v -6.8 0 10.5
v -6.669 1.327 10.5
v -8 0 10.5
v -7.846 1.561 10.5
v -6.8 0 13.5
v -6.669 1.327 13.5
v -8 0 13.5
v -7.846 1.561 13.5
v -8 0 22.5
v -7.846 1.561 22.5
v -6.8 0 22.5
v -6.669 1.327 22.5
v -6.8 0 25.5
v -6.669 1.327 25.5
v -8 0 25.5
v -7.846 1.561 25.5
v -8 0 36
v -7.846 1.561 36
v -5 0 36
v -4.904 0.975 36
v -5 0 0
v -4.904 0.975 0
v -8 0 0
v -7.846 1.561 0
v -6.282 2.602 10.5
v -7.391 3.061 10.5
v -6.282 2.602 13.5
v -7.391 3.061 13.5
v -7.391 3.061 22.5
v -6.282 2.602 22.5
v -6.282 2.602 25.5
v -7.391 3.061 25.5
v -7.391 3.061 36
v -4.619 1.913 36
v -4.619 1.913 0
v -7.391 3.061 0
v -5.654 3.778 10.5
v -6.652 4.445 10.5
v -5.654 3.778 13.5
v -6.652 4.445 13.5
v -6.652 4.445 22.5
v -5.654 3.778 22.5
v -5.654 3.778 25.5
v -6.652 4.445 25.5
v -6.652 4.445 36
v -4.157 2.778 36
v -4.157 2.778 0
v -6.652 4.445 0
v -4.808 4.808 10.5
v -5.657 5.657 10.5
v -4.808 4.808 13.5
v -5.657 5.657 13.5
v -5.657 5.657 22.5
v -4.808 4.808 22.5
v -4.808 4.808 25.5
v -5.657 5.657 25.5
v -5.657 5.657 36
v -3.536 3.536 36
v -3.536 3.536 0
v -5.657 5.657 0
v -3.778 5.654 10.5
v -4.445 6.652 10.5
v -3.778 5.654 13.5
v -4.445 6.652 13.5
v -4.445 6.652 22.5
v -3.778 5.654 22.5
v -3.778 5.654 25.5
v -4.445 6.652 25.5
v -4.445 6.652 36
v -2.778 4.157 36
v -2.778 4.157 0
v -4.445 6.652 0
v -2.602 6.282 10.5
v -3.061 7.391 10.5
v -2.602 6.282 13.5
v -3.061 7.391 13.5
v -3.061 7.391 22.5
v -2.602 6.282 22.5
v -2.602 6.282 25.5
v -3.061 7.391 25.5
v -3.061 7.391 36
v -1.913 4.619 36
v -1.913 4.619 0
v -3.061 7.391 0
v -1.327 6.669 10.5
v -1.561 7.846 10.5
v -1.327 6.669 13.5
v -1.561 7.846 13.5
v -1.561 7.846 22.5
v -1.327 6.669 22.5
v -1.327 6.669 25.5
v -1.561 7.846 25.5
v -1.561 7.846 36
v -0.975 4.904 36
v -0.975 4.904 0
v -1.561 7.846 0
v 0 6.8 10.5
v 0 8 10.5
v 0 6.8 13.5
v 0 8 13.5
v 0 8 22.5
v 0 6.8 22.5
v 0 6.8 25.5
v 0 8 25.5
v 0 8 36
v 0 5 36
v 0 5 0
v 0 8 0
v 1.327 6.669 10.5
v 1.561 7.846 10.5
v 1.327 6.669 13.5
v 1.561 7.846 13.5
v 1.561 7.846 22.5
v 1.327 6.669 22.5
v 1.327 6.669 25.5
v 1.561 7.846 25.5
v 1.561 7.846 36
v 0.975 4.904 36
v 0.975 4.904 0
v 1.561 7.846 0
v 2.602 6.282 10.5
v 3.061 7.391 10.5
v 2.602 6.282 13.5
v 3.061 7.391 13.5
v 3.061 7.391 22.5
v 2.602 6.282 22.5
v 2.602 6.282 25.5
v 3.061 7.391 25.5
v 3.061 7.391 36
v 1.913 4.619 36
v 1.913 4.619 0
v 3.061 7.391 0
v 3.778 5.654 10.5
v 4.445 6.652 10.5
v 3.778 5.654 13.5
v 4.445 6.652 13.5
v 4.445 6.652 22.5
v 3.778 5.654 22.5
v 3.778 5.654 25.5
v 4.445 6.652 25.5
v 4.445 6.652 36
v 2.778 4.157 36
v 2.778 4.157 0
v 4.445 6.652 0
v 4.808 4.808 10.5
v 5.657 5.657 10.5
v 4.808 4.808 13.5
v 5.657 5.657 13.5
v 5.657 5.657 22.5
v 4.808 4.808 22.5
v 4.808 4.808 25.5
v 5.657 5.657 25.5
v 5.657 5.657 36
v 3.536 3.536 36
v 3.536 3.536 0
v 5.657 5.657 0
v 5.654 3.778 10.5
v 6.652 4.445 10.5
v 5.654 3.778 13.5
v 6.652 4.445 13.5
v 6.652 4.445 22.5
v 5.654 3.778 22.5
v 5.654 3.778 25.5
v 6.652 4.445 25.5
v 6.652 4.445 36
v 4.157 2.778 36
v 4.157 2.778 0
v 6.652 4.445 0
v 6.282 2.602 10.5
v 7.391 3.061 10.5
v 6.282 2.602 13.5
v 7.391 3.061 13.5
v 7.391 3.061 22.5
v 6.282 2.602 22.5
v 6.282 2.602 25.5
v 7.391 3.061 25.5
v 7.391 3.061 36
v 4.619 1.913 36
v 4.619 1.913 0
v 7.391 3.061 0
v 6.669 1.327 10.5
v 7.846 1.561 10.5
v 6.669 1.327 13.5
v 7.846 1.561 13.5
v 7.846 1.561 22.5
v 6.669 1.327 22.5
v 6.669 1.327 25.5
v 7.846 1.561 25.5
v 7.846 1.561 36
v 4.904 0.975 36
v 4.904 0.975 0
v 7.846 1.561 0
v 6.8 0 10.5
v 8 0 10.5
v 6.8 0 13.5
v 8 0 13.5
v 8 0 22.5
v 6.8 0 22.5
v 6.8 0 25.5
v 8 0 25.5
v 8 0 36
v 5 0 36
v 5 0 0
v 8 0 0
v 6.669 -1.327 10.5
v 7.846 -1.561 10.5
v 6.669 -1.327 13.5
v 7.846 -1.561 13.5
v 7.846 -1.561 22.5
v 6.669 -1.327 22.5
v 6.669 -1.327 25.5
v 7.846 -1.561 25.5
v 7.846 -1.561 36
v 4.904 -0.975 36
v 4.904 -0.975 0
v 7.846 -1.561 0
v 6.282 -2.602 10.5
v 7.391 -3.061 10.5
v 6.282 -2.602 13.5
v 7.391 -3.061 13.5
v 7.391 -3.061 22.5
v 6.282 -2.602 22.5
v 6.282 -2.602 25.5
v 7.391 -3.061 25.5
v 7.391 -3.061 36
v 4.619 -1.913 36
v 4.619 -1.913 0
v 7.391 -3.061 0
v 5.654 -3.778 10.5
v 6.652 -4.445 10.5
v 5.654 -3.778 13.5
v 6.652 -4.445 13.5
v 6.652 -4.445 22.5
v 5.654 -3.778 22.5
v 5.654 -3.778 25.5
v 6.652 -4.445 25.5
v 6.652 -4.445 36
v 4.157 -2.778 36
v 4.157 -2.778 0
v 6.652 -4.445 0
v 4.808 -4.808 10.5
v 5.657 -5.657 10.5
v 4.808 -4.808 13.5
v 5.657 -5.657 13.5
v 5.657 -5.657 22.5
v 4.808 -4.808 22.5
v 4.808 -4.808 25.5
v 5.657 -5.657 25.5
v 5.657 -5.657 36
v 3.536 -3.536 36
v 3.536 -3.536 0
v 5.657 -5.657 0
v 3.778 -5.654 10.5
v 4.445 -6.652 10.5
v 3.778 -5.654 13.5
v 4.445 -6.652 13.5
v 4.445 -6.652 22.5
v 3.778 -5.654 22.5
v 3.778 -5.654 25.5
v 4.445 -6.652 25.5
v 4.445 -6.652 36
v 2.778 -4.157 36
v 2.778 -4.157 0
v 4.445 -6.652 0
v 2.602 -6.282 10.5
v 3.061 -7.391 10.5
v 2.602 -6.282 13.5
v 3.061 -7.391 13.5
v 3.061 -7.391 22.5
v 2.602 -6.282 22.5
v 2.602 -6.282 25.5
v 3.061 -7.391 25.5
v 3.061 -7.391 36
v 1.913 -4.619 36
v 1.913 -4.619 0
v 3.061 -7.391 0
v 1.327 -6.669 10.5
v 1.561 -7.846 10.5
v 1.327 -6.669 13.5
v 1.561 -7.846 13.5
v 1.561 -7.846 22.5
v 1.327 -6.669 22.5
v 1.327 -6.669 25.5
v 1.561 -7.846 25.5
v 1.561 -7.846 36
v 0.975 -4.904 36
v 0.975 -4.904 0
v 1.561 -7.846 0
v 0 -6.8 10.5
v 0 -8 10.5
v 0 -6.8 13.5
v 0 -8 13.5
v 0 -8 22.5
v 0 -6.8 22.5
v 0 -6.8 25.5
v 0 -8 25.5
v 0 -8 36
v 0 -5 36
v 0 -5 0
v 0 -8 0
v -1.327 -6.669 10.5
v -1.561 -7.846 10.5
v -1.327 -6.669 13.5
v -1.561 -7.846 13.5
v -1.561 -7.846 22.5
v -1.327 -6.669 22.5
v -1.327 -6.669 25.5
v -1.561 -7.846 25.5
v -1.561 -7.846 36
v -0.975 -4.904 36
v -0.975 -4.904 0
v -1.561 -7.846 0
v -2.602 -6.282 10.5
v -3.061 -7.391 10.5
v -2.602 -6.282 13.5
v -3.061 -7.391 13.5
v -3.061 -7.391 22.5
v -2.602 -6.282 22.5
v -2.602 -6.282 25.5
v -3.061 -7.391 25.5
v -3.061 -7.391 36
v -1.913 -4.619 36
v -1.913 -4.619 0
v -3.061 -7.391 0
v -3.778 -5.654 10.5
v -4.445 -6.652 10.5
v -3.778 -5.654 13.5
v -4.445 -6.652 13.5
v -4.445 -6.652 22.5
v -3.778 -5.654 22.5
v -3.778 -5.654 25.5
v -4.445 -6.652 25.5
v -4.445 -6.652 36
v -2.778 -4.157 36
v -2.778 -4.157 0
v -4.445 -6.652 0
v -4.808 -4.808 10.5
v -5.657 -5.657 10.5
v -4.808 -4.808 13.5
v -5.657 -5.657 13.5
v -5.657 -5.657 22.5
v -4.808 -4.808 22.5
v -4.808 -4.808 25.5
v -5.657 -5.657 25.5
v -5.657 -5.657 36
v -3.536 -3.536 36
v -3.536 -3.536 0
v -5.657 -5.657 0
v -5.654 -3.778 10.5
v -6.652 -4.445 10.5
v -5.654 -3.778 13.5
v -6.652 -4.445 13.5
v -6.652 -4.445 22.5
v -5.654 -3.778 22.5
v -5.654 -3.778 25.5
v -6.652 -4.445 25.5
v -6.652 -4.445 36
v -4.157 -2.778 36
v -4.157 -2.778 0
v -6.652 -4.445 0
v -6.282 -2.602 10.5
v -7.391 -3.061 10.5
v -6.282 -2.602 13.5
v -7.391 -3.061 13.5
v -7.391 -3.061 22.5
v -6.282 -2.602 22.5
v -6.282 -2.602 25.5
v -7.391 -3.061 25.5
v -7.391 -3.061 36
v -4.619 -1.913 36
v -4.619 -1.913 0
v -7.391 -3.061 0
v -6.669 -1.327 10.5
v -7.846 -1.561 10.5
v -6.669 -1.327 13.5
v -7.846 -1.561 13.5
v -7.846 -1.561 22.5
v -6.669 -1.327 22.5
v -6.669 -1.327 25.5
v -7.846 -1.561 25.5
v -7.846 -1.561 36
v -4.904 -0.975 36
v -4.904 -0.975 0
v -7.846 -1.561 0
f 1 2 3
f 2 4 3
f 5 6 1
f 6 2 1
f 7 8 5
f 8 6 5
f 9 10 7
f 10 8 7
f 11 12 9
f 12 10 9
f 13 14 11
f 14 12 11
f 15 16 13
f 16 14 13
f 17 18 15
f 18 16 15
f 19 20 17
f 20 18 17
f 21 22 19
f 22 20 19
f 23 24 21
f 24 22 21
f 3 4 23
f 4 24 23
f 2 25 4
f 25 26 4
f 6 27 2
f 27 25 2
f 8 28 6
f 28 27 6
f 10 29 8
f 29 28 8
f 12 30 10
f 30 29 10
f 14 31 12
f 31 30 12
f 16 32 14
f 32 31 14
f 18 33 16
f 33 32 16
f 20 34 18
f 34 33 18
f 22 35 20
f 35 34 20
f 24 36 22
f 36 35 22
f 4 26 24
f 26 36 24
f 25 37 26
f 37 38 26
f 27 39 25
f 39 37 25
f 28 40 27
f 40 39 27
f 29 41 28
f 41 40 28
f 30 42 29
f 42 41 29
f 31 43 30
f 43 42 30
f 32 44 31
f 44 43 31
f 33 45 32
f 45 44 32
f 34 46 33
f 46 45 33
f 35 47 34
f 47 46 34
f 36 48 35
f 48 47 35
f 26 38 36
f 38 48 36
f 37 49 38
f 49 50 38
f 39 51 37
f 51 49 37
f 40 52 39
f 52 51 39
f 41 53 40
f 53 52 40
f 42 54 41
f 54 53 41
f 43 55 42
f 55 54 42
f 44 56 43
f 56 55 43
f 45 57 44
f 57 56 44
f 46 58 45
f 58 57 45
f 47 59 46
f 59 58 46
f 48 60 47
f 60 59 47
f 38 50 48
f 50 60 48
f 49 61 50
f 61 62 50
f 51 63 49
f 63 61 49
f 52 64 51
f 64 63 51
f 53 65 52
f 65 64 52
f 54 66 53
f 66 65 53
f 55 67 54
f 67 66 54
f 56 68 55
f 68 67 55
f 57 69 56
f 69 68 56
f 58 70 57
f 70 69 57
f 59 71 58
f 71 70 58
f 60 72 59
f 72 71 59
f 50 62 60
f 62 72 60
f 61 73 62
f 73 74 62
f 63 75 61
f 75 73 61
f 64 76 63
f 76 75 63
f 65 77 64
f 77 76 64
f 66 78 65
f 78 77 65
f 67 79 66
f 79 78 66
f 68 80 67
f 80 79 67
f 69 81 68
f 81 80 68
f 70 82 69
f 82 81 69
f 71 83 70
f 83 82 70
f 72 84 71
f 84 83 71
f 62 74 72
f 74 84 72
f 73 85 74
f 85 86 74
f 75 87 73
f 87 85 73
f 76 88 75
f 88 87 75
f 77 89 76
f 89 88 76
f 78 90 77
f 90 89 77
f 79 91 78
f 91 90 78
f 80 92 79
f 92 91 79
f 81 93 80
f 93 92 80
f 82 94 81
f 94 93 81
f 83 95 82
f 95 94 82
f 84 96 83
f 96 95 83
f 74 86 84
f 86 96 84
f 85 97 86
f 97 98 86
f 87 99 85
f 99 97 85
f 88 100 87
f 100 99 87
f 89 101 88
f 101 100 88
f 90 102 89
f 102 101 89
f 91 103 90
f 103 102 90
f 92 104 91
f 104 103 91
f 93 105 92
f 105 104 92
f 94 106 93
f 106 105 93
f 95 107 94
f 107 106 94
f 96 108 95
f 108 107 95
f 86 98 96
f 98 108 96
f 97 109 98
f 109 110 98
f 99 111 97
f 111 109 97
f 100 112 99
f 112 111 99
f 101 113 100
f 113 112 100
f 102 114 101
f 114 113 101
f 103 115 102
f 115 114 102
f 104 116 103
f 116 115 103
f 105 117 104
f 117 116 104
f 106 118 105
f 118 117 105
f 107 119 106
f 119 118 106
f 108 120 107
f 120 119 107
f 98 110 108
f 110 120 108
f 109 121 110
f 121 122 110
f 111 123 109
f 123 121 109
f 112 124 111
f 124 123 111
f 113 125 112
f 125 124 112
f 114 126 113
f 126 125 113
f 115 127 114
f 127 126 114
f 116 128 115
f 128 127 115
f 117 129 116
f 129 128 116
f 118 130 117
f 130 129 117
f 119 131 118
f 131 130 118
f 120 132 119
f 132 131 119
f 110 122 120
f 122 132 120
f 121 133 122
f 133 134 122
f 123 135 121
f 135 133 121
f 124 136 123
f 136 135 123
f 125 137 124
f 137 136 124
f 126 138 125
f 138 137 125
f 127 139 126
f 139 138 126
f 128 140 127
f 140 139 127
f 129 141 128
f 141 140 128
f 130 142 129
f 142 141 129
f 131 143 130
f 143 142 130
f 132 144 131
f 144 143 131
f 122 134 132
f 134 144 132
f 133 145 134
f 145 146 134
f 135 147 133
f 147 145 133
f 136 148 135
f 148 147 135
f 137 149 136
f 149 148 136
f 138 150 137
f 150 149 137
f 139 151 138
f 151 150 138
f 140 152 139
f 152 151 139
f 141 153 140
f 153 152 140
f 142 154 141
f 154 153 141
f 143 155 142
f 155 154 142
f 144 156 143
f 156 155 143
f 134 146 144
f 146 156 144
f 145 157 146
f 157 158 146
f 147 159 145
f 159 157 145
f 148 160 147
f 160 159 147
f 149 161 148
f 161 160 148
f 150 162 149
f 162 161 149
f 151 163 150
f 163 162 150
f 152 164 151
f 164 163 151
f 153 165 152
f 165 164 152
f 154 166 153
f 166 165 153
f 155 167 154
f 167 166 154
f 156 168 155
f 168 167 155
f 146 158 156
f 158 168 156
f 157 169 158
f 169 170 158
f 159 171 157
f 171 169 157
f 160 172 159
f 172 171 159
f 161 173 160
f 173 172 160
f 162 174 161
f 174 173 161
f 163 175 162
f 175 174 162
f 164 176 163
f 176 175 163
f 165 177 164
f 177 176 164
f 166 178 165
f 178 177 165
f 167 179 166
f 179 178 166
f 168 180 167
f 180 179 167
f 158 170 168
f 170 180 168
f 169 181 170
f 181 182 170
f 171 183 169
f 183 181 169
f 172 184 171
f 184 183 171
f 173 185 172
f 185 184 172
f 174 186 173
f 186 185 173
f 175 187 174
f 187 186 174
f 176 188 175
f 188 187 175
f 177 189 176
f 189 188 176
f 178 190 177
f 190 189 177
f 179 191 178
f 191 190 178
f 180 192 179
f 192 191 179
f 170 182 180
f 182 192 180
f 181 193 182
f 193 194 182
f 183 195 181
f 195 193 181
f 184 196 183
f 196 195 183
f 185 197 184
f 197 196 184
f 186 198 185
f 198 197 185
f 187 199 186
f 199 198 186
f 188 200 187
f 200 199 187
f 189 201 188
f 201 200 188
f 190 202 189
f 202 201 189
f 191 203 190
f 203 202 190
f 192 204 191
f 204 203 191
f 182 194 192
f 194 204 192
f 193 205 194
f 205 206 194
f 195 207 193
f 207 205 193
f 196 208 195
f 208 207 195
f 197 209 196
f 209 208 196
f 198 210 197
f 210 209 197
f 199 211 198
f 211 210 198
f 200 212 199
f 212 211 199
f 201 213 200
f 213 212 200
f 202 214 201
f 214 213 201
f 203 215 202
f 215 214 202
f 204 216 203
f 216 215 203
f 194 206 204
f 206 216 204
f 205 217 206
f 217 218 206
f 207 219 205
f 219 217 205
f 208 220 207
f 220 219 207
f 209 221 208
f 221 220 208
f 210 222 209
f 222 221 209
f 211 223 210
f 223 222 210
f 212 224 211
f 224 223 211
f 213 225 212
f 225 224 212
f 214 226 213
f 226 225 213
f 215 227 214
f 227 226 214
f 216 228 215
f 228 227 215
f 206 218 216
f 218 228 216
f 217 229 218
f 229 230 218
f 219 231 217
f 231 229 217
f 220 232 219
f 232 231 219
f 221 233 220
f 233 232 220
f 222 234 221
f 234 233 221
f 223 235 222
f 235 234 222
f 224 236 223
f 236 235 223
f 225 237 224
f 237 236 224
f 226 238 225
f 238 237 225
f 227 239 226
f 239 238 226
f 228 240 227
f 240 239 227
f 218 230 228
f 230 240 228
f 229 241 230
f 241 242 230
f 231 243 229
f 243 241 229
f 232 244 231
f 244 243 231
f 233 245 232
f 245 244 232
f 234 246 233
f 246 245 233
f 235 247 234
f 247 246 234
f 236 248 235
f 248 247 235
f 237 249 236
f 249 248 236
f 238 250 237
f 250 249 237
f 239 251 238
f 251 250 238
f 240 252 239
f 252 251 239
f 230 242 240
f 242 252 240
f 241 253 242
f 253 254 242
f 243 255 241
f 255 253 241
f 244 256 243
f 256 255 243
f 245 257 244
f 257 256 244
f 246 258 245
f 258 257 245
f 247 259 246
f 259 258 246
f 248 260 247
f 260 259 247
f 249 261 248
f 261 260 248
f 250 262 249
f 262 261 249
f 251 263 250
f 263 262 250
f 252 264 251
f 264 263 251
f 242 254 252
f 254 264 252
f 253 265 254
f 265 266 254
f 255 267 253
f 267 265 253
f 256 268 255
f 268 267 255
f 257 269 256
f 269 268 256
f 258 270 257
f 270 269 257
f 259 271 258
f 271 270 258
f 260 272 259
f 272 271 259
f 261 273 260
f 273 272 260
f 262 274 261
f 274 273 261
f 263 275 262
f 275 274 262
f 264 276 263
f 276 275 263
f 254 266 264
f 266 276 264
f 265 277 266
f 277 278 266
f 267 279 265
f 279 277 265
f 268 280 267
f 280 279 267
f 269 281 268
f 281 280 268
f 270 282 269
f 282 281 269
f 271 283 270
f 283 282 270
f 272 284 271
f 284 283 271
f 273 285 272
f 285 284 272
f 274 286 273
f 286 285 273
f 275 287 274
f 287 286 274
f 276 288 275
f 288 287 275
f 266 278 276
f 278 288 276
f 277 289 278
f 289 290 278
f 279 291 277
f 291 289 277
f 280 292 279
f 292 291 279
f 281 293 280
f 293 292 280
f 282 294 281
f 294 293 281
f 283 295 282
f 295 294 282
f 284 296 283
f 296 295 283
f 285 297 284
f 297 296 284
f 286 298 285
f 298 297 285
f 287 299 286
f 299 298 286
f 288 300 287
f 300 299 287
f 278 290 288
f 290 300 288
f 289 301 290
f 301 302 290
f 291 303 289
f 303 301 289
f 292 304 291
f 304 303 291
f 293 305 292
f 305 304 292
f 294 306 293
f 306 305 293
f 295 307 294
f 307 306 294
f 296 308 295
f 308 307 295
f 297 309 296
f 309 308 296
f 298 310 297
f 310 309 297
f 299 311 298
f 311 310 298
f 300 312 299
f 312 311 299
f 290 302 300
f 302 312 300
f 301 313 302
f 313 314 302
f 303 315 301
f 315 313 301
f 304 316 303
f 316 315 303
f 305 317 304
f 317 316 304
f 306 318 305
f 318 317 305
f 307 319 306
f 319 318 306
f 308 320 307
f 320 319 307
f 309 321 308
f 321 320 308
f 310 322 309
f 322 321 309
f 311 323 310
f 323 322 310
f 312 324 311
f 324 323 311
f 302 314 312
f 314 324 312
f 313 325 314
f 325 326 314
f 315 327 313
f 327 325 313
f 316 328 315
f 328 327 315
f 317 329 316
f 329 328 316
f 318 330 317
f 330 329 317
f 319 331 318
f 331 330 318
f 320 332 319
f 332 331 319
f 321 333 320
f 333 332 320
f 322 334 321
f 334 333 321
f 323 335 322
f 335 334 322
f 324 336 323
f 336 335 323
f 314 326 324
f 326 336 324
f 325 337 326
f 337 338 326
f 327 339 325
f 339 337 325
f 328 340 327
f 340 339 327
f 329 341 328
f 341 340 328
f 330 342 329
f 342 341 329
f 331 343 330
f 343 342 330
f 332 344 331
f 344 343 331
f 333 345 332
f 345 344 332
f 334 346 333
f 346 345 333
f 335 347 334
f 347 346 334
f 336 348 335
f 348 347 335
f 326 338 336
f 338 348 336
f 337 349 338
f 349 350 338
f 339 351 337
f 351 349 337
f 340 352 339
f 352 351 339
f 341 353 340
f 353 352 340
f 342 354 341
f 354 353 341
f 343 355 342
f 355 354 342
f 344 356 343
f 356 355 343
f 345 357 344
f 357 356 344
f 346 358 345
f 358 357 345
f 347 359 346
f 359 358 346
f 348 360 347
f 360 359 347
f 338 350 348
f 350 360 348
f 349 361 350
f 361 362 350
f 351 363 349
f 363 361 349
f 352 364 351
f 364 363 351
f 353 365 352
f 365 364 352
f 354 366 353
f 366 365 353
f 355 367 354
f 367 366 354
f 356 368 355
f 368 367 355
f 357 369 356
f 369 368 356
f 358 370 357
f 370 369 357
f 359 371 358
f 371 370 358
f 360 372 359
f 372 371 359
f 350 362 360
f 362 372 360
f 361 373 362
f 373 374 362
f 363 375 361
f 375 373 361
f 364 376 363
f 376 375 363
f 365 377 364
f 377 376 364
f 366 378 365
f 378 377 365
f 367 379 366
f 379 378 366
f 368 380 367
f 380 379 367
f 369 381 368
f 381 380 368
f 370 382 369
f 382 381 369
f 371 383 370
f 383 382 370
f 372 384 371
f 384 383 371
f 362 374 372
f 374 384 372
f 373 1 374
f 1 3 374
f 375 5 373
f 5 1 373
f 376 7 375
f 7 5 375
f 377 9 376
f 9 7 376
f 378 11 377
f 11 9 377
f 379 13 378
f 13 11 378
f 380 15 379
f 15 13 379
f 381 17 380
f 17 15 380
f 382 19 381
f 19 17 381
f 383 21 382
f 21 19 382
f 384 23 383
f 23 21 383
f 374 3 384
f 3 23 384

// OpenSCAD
$fn = 32;

// ----------------------------------------------------------------------
// Grooved revolve: plain_grooves, bore R5
// ----------------------------------------------------------------------

// --- parameters (mm) ---
bore_r = 5;               // bore radius
outer_r = 8;              // outer radius of the body
total_h = 36;             // overall height, Z
wall = 3;                 // radial wall thickness
groove_w = 3;             // groove width
groove_d = 1.2;           // groove depth
grooves = 2;              // number of outer grooves

bbox_x = 2 * outer_r;  // full diameter
bore_d = 2 * bore_r;  // bore diameter
body_d = 2 * outer_r;  // body diameter
revolve_angle = 360;  // full turn around the Z axis

profile = [[5, 0], [8, 0], [8, 10.5], [6.8, 10.5], [6.8, 13.5], [8, 13.5], [8, 22.5], [6.8, 22.5], [6.8, 25.5], [8, 25.5], [8, 36], [5, 36]];  // primary outline, 12 points, counter clockwise

// --- the one profile operation ---
rotate_extrude(angle = revolve_angle) polygon(points = profile);
